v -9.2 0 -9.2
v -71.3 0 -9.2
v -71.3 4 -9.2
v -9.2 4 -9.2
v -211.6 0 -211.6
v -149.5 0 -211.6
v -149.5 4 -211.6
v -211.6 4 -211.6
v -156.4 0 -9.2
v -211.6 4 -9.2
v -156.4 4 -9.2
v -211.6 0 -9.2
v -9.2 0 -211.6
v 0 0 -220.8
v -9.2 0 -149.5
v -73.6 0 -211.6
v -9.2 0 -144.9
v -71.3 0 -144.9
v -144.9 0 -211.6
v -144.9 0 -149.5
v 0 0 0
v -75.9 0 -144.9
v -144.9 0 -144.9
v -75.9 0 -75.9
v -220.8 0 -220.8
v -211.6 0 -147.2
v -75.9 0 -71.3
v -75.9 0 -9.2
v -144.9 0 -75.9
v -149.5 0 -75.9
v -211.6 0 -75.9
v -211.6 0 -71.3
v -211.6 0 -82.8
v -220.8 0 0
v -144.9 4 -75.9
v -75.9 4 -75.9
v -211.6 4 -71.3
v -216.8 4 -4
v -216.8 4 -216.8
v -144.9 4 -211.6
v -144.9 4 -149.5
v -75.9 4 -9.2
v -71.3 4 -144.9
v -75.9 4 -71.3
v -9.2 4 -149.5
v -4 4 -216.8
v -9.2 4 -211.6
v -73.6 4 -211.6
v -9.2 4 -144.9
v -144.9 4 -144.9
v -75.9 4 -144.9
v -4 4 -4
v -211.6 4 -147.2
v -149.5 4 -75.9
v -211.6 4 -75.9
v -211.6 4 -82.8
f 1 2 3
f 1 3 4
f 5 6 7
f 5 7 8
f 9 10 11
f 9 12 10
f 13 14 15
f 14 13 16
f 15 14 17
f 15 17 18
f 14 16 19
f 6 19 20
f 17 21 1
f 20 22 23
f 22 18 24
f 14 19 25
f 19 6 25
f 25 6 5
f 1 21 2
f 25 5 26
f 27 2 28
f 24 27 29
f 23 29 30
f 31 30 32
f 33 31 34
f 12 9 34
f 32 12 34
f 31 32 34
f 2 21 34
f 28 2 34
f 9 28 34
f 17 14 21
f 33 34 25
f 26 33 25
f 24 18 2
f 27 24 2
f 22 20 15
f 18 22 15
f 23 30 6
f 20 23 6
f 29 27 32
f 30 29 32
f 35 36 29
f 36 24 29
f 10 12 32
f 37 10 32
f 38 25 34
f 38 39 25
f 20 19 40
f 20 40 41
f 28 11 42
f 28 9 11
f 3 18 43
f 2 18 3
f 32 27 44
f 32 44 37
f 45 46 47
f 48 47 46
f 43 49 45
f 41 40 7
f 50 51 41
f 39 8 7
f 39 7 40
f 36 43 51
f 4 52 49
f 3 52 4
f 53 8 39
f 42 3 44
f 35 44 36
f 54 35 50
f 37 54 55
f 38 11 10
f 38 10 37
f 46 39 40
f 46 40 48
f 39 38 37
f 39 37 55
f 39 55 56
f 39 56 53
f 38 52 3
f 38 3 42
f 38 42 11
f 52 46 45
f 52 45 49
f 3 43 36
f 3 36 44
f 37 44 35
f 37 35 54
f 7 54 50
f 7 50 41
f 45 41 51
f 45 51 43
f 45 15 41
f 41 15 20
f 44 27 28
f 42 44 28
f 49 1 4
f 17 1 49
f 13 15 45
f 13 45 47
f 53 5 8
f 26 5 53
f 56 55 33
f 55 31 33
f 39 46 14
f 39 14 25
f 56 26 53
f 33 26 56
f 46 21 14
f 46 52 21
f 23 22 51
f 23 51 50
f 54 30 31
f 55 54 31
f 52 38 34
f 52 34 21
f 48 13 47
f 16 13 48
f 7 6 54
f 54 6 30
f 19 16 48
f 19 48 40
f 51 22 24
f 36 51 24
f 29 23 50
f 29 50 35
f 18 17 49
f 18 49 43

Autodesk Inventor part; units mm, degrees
ref_plane "YZ Plane" through (0, 0, 0) normal (1, 0, 0) x (0, 1, 0)
ref_plane "XZ Plane" through (0, 0, 0) normal (0, 1, 0) x (-1, 0, 0)
ref_plane "XY Plane" through (0, 0, 0) normal (0, 0, 1) x (1, 0, 0)
sketch "Boceto1" plane through (0, 0, 0) normal (0, 1, 0) x (-1, 0, 0)
  line L0 (0, 0) -> (220.8, 0)
  line L1 (220.8, 0) -> (220.8, -220.8)
  line L2 (220.8, -220.8) -> (0, -220.8)
  line L3 (0, -220.8) -> (0, 0)
  line L4 (211.6, -211.6) -> (211.6, -147.2)
  line L5 (211.6, -9.2) -> (156.4, -9.2)
  line L6 (9.2, -211.6) -> (73.6, -211.6)
  line L7 (73.6, -211.6) -> (73.6, -209.3)
  line L8 (75.9, -71.3) -> (211.6, -71.3)
  line L9 (149.5, -211.6) -> (149.5, -75.9)
  line L10 (211.6, -9.2) -> (211.6, -71.3)
  line L11 (211.6, -75.9) -> (211.6, -82.8)
  line L12 (211.6, -211.6) -> (211.6, -75.9)
  line L13 (211.6, -71.3) -> (211.6, -9.2)
  line L14 (75.9, -75.9) -> (144.9, -75.9)
  line L15 (149.5, -75.9) -> (211.6, -75.9)
  line L16 (9.2, -149.5) -> (144.9, -149.5)
  line L17 (144.9, -211.6) -> (144.9, -149.5)
  line L18 (144.9, -144.9) -> (144.9, -75.9)
  line L19 (71.3, -144.9) -> (71.3, -9.2)
  line L20 (9.2, -144.9) -> (71.3, -144.9)
  line L21 (75.9, -144.9) -> (144.9, -144.9)
  line L22 (75.9, -144.9) -> (75.9, -75.9)
  line L23 (75.9, -71.3) -> (75.9, -9.2)
  line L24 (211.6, -9.2) -> (75.9, -9.2)
  line L25 (71.3, -9.2) -> (9.2, -9.2)
  line L26 (9.2, -9.2) -> (9.2, -144.9)
  line L27 (9.2, -149.5) -> (9.2, -211.6)
  line L28 (9.2, -211.6) -> (144.9, -211.6)
  line L29 (149.5, -211.6) -> (211.6, -211.6)
  dimension "d0" = 220.8
  dimension "d1" = 220.8
extrude "Extrusión1" add sketch "Boceto1" along normal blind 4
chamfer "Chaflán1" distance 4 angle 45 4 edges at (-220.8, 4, -110.4) (-110.4, 4, 0) (0, 4, -110.4) (-110.4, 4, -220.8) measured on face at (-121.9, 4, -217.7333)
properties part number "Lampara2"
